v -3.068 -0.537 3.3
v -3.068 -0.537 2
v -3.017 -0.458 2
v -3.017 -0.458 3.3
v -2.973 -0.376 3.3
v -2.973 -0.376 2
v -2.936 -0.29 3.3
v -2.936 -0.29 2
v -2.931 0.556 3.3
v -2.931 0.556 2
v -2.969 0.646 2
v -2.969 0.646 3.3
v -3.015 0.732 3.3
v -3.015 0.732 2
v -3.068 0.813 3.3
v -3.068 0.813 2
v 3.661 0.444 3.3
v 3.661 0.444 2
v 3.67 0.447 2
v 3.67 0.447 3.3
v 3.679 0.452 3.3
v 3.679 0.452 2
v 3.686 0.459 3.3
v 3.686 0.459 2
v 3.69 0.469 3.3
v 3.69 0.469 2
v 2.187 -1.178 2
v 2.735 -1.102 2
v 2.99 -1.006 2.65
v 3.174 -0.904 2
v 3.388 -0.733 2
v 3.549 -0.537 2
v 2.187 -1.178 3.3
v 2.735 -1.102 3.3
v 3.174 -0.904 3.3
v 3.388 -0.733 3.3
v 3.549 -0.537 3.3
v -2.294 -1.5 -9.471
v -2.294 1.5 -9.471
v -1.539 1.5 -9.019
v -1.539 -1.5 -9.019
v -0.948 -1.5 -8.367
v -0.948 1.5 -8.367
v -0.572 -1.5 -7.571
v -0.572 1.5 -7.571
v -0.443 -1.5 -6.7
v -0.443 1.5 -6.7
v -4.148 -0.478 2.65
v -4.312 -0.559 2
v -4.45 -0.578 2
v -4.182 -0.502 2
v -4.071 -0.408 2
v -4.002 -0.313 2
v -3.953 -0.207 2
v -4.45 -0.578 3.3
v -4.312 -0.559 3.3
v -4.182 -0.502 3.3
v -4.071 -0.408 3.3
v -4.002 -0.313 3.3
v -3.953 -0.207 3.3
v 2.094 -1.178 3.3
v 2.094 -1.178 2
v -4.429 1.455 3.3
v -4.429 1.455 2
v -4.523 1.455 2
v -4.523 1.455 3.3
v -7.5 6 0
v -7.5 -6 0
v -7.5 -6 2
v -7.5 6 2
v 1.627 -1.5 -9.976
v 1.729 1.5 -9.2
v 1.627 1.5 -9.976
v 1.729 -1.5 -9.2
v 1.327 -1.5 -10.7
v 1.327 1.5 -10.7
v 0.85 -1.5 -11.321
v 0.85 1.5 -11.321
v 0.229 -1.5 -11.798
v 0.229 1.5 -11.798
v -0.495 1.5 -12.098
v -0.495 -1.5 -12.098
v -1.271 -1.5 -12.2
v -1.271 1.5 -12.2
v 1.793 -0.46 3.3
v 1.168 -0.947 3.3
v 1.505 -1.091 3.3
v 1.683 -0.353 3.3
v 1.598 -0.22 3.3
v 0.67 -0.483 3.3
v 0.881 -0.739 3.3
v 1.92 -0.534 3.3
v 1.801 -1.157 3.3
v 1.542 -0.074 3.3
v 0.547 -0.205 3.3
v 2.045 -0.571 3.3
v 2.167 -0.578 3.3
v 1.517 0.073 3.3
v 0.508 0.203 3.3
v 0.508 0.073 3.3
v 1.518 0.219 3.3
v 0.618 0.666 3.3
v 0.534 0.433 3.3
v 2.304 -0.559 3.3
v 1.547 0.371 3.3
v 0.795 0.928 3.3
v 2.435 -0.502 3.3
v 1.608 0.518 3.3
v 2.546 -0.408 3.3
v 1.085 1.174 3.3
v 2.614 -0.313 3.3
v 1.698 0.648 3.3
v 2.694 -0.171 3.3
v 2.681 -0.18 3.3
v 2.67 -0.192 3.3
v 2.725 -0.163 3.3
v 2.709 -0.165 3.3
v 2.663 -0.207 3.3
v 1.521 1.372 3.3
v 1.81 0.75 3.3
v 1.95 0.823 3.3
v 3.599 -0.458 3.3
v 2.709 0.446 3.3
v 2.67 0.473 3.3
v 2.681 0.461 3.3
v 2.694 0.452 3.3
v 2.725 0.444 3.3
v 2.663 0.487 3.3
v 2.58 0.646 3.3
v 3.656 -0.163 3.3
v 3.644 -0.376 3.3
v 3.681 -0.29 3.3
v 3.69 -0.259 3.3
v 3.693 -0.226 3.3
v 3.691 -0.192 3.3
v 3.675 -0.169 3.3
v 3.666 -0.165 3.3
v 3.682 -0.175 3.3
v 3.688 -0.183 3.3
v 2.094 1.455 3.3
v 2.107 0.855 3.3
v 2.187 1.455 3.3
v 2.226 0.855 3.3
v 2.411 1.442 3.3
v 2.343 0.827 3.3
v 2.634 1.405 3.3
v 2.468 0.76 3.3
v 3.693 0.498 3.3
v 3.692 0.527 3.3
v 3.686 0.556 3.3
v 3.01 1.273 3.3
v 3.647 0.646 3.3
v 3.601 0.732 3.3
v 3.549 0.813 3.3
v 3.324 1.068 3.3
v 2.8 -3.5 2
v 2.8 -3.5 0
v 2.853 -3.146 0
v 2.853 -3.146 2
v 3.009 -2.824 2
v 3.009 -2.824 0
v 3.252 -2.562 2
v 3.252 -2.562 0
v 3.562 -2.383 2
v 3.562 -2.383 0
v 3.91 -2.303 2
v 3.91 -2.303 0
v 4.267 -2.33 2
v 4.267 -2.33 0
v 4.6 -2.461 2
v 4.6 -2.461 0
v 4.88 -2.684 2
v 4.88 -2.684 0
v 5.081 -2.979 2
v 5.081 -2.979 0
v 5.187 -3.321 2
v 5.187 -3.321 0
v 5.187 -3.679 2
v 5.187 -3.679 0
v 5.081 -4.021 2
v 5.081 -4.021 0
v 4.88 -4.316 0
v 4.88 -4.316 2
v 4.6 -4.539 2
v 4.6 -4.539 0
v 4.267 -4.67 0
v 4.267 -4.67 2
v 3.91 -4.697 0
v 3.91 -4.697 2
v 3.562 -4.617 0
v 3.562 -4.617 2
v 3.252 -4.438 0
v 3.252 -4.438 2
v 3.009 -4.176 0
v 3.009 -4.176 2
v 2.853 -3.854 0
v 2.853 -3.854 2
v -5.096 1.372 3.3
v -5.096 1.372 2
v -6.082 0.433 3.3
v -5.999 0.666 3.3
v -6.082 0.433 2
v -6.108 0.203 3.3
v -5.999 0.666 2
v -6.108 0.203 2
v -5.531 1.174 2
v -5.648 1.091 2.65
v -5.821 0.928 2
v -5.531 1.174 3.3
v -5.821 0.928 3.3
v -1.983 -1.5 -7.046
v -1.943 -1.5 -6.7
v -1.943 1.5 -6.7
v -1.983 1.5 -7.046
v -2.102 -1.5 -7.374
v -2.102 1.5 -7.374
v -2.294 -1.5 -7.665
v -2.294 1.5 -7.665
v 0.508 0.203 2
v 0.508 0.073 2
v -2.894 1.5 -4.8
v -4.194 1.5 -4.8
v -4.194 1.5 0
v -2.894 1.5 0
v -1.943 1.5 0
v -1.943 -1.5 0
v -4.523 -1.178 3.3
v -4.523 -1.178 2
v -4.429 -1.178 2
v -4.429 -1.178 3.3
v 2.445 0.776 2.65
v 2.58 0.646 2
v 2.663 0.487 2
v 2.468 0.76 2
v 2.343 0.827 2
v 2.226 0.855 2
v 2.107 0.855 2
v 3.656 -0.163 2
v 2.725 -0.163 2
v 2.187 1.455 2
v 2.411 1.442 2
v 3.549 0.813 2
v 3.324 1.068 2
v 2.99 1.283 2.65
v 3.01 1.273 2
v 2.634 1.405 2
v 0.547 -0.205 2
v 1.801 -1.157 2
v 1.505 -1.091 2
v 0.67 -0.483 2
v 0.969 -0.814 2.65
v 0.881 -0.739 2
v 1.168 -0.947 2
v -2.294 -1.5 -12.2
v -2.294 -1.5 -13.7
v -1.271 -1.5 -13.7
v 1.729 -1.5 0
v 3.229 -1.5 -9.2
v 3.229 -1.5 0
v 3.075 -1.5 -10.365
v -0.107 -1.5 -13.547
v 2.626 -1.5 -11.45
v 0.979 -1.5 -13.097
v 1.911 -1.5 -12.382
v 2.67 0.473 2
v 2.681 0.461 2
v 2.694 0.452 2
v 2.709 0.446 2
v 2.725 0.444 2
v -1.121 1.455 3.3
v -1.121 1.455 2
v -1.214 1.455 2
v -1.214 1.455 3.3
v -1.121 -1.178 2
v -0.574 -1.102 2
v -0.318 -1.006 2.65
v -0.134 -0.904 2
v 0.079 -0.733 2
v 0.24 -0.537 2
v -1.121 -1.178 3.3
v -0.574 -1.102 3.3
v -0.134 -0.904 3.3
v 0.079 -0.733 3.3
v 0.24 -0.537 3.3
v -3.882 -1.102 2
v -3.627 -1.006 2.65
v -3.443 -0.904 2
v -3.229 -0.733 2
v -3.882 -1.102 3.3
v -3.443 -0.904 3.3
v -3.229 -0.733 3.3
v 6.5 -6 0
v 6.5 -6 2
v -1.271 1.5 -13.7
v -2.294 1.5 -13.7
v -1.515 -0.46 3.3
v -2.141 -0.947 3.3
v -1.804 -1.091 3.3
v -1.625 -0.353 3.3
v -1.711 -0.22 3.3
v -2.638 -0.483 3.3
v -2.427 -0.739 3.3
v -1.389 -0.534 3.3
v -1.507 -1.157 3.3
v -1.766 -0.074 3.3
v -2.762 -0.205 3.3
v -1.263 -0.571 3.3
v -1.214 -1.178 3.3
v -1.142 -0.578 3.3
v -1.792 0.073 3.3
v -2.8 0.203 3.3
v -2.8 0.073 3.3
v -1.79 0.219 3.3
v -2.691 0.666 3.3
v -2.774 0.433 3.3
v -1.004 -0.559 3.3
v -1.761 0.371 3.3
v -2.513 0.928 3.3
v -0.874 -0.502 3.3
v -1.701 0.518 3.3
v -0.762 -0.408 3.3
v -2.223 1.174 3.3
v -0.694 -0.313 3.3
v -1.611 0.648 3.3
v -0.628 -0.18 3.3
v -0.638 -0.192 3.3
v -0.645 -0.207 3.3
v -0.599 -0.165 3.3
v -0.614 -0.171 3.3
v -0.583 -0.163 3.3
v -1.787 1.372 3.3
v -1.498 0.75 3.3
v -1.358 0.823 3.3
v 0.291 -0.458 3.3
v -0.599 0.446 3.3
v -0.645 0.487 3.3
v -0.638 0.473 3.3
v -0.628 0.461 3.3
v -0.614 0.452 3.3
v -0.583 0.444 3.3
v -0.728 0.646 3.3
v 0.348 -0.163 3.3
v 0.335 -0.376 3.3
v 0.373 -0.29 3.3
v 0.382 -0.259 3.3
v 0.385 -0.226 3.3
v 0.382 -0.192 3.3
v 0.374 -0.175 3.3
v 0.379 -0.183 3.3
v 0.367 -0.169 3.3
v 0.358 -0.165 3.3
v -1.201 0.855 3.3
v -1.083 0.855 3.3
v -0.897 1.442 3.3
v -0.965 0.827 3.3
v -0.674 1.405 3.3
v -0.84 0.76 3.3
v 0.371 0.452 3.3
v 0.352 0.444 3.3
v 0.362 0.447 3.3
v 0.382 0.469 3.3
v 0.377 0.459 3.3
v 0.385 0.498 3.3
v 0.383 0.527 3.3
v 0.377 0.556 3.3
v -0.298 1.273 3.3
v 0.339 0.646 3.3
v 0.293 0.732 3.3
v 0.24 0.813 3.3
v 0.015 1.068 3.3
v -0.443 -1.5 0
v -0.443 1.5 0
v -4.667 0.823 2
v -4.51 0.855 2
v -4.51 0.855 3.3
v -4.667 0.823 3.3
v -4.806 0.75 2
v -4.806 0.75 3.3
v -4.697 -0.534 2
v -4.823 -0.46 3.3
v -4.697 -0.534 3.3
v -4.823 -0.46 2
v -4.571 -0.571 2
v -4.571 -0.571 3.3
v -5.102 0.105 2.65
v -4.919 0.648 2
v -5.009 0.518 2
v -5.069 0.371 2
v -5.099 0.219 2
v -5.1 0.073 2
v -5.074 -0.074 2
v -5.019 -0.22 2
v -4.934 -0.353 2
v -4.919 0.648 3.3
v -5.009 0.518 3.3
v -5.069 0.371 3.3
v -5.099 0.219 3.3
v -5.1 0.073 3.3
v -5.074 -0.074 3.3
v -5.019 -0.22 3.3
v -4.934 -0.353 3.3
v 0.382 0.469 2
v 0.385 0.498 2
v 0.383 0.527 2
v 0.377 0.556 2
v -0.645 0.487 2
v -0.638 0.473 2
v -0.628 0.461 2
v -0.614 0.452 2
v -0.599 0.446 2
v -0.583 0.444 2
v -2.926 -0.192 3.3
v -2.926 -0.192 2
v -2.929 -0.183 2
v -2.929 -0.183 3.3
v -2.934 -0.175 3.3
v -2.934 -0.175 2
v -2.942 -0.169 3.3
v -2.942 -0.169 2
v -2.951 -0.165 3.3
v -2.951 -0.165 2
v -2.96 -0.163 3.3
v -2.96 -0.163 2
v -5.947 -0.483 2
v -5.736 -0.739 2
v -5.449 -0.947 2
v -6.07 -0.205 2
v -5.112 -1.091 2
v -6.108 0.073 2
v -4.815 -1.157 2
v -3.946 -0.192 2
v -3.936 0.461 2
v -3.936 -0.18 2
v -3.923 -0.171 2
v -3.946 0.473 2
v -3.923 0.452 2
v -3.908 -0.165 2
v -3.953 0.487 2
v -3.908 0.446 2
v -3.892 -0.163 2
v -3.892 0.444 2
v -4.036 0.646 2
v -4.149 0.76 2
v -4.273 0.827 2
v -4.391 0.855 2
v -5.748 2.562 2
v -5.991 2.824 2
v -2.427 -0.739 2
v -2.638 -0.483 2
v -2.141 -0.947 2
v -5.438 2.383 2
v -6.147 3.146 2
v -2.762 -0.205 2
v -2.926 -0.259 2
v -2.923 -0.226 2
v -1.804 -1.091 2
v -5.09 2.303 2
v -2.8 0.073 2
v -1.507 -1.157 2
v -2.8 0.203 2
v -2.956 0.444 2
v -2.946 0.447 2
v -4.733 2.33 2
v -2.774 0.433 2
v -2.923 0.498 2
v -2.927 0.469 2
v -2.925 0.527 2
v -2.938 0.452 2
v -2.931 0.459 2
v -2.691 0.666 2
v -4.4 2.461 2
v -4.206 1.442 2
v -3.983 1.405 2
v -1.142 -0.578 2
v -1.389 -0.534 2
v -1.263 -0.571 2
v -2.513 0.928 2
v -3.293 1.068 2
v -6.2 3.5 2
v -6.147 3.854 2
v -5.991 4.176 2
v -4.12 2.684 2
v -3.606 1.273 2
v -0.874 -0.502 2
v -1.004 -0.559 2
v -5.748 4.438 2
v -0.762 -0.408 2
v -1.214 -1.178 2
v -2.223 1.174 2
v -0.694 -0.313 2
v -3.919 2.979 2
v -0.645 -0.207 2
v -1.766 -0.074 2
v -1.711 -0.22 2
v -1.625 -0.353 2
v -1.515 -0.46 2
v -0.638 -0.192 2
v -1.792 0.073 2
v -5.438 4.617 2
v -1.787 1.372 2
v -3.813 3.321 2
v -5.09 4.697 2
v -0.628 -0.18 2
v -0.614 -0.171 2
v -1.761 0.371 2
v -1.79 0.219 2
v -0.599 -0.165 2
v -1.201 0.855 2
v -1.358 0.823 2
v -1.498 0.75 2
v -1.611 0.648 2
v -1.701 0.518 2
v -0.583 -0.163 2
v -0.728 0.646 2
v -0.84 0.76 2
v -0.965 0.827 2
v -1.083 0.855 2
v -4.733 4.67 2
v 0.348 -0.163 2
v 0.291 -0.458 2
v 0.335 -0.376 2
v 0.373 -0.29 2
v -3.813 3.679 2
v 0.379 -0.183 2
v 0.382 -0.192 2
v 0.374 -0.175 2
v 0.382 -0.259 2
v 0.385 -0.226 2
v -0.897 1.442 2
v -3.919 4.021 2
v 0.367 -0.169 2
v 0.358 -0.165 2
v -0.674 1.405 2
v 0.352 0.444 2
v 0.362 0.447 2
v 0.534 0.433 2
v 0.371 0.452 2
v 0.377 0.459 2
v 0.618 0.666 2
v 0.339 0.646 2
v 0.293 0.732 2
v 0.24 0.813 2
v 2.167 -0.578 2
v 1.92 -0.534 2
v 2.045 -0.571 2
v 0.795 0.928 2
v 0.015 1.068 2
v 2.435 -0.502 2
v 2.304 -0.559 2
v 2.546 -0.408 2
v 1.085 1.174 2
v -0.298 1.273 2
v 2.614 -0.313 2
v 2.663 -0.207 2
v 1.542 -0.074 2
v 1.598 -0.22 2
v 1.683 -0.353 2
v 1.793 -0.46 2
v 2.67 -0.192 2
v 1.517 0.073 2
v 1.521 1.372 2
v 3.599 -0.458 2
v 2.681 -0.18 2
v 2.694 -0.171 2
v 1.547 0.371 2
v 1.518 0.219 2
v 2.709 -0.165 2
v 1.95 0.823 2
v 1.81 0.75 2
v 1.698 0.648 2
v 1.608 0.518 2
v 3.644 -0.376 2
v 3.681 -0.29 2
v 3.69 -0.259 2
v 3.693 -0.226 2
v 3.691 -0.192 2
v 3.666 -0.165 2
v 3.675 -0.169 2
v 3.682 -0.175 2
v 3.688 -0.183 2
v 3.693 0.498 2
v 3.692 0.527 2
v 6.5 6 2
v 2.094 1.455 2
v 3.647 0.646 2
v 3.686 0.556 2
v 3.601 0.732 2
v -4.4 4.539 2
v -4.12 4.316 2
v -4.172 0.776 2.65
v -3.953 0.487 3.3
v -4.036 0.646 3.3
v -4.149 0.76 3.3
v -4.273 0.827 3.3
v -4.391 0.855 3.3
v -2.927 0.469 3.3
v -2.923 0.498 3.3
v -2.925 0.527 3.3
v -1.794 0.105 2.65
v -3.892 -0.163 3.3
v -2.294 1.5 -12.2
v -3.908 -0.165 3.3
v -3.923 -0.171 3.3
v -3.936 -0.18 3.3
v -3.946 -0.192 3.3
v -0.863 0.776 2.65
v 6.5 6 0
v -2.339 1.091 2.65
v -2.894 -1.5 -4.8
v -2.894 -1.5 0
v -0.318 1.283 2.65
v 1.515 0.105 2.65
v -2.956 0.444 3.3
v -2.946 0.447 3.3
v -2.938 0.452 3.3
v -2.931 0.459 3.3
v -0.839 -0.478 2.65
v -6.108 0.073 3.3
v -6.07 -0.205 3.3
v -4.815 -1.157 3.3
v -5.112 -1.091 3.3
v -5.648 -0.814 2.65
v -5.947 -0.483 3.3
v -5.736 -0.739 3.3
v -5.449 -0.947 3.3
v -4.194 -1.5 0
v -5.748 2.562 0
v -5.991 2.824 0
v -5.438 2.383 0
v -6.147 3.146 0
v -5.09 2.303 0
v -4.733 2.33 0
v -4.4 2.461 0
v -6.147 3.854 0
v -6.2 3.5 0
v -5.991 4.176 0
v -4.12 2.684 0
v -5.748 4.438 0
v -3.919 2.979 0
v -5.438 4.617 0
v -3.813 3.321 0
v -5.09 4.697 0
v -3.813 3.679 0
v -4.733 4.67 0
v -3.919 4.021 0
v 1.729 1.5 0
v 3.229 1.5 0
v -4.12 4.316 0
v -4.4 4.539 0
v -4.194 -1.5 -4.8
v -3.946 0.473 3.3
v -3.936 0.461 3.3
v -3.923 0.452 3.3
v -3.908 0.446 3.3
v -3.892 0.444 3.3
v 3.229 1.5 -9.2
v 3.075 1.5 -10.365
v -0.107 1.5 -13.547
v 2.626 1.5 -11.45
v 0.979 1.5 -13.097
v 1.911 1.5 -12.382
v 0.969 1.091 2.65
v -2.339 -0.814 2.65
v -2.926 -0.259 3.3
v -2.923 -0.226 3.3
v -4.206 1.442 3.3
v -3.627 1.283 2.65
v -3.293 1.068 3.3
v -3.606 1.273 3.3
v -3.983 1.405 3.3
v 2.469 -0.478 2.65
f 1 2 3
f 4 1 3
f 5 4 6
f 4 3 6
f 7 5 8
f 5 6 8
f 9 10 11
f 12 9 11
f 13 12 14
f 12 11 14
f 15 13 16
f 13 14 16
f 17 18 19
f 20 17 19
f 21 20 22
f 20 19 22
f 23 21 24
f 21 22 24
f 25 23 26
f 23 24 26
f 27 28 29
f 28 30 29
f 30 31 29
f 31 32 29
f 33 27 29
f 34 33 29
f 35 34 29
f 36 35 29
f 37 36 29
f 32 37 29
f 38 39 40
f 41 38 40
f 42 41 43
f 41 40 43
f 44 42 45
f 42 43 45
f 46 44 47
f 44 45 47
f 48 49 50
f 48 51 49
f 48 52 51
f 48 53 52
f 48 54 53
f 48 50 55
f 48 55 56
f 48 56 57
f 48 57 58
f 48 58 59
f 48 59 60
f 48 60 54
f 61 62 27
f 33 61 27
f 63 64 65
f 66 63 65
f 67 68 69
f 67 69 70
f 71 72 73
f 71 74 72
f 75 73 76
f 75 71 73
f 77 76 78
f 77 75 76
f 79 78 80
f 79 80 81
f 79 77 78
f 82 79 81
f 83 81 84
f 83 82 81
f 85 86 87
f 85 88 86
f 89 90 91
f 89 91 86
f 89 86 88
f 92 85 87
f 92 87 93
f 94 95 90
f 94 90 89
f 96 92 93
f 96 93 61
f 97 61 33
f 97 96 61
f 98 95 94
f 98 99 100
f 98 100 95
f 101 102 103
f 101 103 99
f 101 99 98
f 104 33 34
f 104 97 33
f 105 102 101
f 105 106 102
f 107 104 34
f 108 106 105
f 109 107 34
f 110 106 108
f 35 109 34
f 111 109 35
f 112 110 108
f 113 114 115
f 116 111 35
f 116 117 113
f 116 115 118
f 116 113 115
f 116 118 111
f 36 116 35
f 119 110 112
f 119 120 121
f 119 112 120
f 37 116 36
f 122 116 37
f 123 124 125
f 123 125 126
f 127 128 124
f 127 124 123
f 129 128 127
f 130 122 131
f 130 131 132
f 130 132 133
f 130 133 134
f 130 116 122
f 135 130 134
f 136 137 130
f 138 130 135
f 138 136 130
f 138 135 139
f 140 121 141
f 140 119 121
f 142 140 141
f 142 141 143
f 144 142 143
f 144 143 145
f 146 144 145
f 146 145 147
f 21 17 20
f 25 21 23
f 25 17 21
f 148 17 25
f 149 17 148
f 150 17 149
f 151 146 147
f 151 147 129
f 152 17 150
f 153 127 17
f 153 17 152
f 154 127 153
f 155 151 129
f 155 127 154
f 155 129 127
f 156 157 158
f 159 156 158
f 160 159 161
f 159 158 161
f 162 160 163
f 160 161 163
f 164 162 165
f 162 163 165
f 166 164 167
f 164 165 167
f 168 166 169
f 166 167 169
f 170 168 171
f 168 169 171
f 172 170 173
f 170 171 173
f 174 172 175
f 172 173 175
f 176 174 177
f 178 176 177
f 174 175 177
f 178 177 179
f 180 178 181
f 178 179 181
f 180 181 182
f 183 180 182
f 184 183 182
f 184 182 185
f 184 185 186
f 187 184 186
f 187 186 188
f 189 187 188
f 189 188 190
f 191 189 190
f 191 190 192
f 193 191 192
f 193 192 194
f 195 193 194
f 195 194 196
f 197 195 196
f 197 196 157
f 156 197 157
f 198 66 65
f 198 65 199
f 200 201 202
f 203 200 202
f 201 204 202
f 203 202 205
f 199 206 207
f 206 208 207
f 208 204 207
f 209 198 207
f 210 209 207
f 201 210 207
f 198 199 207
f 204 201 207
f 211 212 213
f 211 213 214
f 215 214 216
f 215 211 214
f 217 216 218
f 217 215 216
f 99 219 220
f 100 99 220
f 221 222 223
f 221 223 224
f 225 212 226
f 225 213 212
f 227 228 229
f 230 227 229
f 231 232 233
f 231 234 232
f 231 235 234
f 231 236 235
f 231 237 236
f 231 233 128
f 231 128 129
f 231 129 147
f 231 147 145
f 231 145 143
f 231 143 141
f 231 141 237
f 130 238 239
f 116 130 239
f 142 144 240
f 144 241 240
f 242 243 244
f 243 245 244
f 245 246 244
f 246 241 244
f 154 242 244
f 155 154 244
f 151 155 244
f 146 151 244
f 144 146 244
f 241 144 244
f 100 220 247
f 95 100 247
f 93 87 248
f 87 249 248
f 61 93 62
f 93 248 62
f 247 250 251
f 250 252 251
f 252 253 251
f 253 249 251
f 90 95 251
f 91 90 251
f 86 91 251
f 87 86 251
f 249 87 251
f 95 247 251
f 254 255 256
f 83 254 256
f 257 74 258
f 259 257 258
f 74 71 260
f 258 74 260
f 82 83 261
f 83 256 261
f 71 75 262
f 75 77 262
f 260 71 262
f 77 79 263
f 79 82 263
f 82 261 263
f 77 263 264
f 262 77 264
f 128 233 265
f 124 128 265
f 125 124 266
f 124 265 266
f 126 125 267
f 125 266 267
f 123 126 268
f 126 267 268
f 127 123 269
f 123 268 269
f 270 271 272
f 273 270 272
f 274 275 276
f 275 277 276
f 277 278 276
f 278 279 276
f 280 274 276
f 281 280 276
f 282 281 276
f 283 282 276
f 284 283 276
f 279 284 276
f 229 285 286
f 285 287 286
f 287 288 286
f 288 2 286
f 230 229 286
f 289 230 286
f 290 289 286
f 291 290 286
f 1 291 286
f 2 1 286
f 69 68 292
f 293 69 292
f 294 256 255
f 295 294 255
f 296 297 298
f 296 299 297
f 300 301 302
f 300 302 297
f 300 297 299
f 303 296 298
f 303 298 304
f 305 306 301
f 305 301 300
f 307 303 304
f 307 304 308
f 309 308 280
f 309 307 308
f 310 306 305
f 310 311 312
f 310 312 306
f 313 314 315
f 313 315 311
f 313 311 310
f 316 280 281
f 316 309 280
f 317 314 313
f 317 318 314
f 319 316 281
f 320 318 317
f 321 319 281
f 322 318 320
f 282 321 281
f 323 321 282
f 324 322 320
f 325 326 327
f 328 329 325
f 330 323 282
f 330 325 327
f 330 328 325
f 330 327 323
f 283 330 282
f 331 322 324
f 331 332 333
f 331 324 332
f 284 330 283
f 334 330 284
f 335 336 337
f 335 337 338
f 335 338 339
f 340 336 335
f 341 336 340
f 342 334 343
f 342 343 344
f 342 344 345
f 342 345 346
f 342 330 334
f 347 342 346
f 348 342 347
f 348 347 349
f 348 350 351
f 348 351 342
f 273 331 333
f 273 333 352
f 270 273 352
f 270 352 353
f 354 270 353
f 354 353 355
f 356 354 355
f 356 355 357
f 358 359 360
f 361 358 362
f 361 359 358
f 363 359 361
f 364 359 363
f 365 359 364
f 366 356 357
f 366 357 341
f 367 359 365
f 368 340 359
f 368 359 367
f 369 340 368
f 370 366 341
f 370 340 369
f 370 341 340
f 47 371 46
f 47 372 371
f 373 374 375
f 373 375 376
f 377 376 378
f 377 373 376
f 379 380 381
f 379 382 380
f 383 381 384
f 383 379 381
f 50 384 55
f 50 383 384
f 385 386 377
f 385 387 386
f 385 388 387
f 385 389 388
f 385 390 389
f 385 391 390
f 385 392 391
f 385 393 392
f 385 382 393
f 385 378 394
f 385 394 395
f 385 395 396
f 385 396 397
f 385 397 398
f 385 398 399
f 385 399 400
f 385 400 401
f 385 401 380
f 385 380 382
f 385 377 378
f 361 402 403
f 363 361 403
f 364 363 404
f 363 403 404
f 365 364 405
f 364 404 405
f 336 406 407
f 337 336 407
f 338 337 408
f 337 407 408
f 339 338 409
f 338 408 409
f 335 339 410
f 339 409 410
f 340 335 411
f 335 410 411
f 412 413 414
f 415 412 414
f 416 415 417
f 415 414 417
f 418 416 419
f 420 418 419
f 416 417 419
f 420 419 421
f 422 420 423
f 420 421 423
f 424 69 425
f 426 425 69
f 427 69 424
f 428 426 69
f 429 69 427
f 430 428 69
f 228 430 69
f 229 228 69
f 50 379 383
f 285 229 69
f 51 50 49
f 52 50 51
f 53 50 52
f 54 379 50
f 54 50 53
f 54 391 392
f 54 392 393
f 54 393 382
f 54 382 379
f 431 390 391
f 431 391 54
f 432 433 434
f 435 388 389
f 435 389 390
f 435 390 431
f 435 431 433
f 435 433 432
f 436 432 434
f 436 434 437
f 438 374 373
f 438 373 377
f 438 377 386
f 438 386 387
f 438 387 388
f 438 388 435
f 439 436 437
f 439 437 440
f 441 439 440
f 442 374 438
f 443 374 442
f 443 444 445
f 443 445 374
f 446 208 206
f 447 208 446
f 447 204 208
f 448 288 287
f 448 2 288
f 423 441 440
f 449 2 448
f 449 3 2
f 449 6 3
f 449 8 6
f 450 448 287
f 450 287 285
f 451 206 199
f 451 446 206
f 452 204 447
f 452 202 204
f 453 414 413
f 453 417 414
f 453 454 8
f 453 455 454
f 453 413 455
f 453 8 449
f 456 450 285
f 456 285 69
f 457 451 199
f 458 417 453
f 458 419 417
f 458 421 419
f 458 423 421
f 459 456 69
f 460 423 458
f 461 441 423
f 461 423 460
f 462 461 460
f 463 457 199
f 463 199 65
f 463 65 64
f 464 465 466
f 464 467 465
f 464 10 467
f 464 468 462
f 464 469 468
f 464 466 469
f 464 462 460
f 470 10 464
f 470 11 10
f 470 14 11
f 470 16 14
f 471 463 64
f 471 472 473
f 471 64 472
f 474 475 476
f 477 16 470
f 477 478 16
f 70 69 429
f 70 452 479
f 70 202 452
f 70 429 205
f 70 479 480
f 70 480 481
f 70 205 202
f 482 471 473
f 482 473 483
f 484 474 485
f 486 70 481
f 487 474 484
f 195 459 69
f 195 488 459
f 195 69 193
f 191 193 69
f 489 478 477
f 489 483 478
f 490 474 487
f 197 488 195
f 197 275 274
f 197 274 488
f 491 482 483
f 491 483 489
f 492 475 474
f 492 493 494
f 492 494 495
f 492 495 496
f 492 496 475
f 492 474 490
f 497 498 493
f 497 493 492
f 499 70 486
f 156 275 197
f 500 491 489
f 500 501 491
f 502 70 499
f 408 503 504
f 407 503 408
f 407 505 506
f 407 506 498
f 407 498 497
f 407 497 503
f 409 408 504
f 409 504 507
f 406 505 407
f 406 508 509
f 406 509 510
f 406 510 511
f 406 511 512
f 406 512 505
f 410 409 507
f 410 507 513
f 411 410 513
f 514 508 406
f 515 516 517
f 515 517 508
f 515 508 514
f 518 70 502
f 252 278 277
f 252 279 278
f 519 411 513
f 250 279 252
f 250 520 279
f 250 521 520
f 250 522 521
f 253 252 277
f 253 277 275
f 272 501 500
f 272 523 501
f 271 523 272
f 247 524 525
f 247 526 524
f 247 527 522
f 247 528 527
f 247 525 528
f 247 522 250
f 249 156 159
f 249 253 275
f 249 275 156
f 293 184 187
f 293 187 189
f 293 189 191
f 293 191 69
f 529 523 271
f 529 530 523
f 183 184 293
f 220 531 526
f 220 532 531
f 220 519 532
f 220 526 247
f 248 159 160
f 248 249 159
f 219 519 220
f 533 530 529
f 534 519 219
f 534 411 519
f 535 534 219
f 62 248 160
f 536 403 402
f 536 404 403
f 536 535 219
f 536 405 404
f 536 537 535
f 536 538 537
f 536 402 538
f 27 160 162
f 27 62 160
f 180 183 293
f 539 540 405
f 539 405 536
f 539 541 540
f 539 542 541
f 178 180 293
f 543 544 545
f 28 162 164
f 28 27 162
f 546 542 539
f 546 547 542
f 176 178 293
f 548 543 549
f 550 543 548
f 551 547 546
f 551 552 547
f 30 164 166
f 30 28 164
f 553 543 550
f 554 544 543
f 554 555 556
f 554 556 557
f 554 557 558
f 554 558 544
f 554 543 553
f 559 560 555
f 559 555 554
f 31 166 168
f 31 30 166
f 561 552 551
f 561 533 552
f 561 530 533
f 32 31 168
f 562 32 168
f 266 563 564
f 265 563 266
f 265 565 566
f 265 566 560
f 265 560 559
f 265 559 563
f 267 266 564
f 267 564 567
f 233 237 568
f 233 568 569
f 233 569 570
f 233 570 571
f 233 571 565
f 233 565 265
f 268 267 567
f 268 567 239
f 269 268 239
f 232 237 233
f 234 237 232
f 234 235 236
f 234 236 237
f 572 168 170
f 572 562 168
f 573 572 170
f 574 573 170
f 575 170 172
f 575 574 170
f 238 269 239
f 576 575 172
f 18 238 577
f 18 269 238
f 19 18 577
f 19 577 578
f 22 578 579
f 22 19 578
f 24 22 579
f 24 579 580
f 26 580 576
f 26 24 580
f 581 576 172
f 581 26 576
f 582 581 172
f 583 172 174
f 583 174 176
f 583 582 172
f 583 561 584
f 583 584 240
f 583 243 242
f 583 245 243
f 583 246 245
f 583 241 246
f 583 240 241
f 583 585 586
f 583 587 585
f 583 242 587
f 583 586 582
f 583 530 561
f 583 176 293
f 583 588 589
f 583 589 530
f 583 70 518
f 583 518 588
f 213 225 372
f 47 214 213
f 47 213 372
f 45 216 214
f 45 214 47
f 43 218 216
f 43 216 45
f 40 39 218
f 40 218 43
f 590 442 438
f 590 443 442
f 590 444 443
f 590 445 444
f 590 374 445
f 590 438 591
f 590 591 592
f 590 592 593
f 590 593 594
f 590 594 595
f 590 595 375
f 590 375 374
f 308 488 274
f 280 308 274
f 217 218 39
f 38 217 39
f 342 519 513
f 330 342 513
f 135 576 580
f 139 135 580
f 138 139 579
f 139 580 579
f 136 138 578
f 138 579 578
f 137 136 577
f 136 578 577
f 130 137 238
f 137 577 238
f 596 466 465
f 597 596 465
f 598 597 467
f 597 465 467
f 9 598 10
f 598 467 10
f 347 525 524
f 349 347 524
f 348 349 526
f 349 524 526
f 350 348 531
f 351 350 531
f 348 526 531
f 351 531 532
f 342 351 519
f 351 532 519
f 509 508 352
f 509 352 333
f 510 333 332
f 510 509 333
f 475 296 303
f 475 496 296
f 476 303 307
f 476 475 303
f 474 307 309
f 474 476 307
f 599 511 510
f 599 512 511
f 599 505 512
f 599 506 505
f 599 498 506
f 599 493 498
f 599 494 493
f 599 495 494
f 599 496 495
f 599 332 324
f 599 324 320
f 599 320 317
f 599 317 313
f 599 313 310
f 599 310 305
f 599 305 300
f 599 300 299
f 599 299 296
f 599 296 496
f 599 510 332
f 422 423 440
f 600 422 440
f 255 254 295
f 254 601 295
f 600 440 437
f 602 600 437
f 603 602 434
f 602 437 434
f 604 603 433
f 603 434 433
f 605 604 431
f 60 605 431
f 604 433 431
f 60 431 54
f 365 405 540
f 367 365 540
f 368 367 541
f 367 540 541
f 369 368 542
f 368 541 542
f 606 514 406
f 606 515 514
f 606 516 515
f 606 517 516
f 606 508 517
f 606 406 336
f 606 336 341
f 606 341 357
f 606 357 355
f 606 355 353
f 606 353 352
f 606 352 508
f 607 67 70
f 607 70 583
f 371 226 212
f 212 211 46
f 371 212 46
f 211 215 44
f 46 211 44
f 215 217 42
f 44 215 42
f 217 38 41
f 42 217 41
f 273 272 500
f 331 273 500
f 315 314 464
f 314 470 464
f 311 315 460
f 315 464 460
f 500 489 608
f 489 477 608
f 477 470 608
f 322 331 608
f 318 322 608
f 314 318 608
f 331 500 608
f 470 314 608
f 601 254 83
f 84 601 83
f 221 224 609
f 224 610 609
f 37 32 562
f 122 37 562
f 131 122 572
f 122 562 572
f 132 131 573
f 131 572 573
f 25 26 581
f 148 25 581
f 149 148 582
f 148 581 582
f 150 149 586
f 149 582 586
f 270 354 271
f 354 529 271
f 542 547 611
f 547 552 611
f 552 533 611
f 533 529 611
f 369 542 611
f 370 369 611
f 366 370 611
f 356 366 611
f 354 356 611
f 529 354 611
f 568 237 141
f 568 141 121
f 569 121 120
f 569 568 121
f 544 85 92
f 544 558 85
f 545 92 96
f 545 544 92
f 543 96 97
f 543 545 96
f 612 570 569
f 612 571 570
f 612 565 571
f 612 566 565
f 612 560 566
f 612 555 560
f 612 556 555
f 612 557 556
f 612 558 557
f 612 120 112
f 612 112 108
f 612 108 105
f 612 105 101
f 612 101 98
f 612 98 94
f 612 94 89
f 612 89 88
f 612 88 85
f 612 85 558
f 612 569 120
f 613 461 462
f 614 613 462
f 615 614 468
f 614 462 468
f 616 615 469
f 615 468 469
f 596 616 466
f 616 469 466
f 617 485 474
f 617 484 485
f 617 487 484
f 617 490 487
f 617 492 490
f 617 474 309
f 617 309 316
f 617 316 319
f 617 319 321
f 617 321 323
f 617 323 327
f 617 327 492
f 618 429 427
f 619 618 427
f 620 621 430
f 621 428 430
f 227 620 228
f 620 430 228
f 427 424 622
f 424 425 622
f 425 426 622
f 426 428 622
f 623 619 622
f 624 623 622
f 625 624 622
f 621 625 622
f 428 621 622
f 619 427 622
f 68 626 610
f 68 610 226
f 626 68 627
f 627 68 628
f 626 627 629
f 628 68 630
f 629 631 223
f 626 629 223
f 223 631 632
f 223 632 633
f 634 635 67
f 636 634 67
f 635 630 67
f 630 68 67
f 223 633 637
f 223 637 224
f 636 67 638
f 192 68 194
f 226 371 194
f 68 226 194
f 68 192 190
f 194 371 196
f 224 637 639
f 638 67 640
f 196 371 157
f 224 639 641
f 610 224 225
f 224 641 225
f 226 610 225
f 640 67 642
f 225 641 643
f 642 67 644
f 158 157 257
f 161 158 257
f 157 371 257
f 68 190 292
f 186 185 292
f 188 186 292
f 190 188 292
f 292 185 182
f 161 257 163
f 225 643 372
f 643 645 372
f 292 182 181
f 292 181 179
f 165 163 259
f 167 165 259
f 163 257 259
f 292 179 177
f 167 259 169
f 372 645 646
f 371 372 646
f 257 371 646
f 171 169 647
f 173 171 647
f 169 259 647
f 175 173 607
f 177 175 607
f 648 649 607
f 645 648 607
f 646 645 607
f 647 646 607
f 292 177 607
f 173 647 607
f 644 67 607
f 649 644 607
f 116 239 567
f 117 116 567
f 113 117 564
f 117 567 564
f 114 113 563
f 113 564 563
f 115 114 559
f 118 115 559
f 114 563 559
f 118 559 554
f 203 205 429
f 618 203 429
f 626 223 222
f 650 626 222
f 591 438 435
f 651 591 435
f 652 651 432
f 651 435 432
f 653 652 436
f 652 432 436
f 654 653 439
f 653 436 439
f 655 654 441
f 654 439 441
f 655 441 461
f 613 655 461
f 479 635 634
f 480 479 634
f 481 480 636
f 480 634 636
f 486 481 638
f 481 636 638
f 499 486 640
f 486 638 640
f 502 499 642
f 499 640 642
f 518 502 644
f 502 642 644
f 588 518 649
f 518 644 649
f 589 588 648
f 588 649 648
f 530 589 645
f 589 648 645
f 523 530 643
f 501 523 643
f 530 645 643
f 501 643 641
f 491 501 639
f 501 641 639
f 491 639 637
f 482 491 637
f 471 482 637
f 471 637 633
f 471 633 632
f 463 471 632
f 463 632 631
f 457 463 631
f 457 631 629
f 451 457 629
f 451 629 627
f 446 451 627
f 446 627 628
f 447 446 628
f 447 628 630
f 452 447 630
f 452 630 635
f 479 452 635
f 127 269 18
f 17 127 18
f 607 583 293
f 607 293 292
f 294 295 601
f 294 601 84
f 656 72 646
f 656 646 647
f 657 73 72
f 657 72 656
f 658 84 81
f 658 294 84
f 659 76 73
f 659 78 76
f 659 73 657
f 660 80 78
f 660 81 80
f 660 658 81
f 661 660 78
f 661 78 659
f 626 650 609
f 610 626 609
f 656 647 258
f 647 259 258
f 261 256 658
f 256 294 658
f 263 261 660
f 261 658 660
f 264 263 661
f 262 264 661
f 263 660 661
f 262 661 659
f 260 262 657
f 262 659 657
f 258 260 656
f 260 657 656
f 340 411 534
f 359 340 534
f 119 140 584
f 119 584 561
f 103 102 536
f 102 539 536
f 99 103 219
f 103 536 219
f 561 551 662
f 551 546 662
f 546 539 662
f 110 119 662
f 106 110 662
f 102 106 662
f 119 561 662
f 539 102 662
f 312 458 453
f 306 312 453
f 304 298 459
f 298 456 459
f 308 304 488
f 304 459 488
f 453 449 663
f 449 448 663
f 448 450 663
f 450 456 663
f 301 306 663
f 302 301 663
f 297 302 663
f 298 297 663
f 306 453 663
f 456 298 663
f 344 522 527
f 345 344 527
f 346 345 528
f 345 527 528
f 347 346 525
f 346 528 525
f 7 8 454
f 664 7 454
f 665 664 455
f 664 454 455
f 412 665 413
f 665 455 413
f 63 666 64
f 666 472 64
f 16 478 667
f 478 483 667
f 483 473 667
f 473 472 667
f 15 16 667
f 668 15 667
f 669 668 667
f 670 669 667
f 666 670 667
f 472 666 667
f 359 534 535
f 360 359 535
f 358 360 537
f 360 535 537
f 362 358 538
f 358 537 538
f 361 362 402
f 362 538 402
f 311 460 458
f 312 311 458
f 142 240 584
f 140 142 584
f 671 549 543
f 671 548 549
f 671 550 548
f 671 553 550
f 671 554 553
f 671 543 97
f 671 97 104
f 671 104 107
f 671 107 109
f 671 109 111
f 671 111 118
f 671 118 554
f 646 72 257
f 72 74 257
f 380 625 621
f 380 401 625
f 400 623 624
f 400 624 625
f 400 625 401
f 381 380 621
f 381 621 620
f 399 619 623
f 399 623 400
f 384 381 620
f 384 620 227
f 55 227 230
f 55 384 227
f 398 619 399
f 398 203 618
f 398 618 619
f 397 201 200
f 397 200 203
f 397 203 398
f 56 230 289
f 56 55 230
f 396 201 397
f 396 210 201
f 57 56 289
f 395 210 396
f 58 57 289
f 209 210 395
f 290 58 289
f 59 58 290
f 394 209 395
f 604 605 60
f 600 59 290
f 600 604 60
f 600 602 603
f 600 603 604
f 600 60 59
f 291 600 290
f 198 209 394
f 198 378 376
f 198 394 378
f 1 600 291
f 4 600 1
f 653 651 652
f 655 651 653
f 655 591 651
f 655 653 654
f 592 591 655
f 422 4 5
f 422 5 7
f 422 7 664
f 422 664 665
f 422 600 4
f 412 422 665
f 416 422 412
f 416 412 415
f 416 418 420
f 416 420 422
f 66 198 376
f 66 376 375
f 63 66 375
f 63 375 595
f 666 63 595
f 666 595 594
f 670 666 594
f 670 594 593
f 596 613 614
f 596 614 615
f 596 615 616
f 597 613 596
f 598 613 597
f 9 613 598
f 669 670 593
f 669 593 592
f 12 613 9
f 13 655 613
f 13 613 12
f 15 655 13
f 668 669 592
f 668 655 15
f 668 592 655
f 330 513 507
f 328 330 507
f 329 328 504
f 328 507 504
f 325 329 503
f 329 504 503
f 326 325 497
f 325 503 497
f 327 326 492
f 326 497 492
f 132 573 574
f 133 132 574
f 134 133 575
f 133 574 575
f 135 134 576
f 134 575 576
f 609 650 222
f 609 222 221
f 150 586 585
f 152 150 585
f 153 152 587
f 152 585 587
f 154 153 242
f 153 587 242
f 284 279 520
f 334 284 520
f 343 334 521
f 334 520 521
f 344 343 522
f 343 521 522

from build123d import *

# Parameters (mm, degrees)
SKETCH1_W           = 15
SKETCH1_H           = 12
BOSS_EXTRUDE1_DEPTH = 2
BOSS_EXTRUDE2_DEPTH = 2
SKETCH3_W           = 1.5
SKETCH3_H           = 4.8
BOSS_EXTRUDE3_DEPTH = 1.5
FILLET3_R           = 1.5
FILLET4_R           = 3
FILLET5_R           = 3
FILLET6_R           = 4.5
SKETCH4_W           = 2
SKETCH4_H           = 12
CUT_EXTRUDE1_DEPTH  = 1
SKETCH5_R           = 1.2
CUT_EXTRUDE2_DEPTH  = 17.731407672
CUT_EXTRUDE3_START  = -0.7
CUT_EXTRUDE3_DEPTH  = 0.7
SKETCH7_W           = 1.148621372
SKETCH7_H           = 6.2
CUT_EXTRUDE4_DEPTH  = 18.325992122
SKETCH8_W           = 0.2
SKETCH8_H           = 4.8
CUT_EXTRUDE5_DEPTH  = 18.325992122


with BuildPart() as part:
    # Sketch1 → Boss-Extrude1 (new body)
    with BuildSketch(Plane.XY):
        Rectangle(SKETCH1_W, SKETCH1_H)
    extrude(amount=BOSS_EXTRUDE1_DEPTH)

    # Sketch2 → Boss-Extrude2 (add)
    with BuildSketch(Plane.XY.offset(2)):
        with BuildLine():
            Line((-0.583484164, 0.443787032), (0.352350759, 0.443787032))
            ThreePointArc((0.352350759, 0.443787032), (0.370660979, 0.451874829), (0.381594807, 0.468641703))
            ThreePointArc((0.381594807, 0.468641703), (0.38478126, 0.512633483), (0.377406248, 0.556119567))
            ThreePointArc((0.377406248, 0.556119567), (0.316958398, 0.689104808), (0.240244136, 0.81341868))
            add(Edge.make_bspline(
                [(0.240244136, 0.81341868), (-0.178053426, 1.454553053), (-1.120854898, 1.454553053)],
                knots=[3.484341046, 3.484341046, 3.484341046, 4.522924348, 4.522924348, 4.522924348], degree=2, weights=[1, 0.868170926, 1]))
            Line((-1.120854898, 1.454553053), (-1.214475951, 1.454553068))
            add(Edge.make_bspline(
                [(-1.214475951, 1.454553068), (-2.800132813, 1.454553068), (-2.800132813, 0.203397992)],
                knots=[1.670440536, 1.670440536, 1.670440536, 3.203377674, 3.203377674, 3.203377674], degree=2, weights=[1, 0.720364542, 1]))
            Line((-2.800132813, 0.203397992), (-2.800132806, 0.073267738))
            add(Edge.make_bspline(
                [(-2.800132806, 0.073267738), (-2.800132806, -1.177887338), (-1.214475944, -1.177887338)],
                knots=[3.079807634, 3.079807634, 3.079807634, 4.612744771, 4.612744771, 4.612744771], degree=2, weights=[1, 0.720364542, 1]))
            Line((-1.214475944, -1.177887338), (-1.120854891, -1.177887375))
            add(Edge.make_bspline(
                [(-1.120854891, -1.177887375), (-0.178053419, -1.177887375), (0.240244143, -0.536753002)],
                knots=[1.760260959, 1.760260959, 1.760260959, 2.798844261, 2.798844261, 2.798844261], degree=2, weights=[1, 0.868170926, 1]))
            ThreePointArc((0.240244143, -0.536753002), (0.313994237, -0.417650167), (0.372658208, -0.290437354))
            ThreePointArc((0.372658208, -0.290437354), (0.384251196, -0.24211404), (0.382489087, -0.192450825))
            ThreePointArc((0.382489087, -0.192450825), (0.370484527, -0.171527836), (0.347824512, -0.163257123))
            Line((0.347824512, -0.163257123), (-0.58348421, -0.163257123))
            ThreePointArc((-0.58348421, -0.163257123), (-0.62125204, -0.175257922), (-0.645165579, -0.206858093))
            add(Edge.make_bspline(
                [(-1.141657158, -0.577741646), (-0.776549247, -0.578100851), (-0.645165579, -0.206858093)],
                knots=[5.955155363, 5.955155363, 5.955155363, 7.020735545, 7.020735545, 7.020735545], degree=2, weights=[1, 0.86139323, 1]))
            add(Edge.make_bspline(
                [(-1.201450314, 0.854894524), (-1.823540048, 0.823436889), (-1.793554178, 0.104979402), (-1.763568309, -0.613478086), (-1.141657158, -0.577741646)],
                knots=[0.039432941, 0.039432941, 0.039432941, 1.613207044, 1.613207044, 3.186981147, 3.186981147, 3.186981147], degree=2, weights=[1, 0.706053195, 1, 0.706053195, 1]))
            add(Edge.make_bspline(
                [(-0.645165584, 0.487388037), (-0.79140441, 0.900606071), (-1.201450314, 0.854894524)],
                knots=[2.404042441, 2.404042441, 2.404042441, 3.565685694, 3.565685694, 3.565685694], degree=2, weights=[1, 0.836012096, 1]))
            ThreePointArc((-0.645165584, 0.487388037), (-0.621252025, 0.455787841), (-0.583484164, 0.443787032))
        make_face()
        with BuildLine():
            Line((-3.89178871, 0.443787032), (-2.955953786, 0.443787032))
            ThreePointArc((-2.955953786, 0.443787032), (-2.937643536, 0.451874816), (-2.926709688, 0.468641703))
            ThreePointArc((-2.926709688, 0.468641703), (-2.923523234, 0.512633483), (-2.930898247, 0.556119567))
            ThreePointArc((-2.930898247, 0.556119567), (-2.991346096, 0.689104808), (-3.068060358, 0.81341868))
            add(Edge.make_bspline(
                [(-3.068060358, 0.81341868), (-3.48635792, 1.454553053), (-4.429159392, 1.454553053)],
                knots=[3.484341046, 3.484341046, 3.484341046, 4.522924348, 4.522924348, 4.522924348], degree=2, weights=[1, 0.868170926, 1]))
            Line((-4.429159392, 1.454553053), (-4.522780446, 1.454553068))
            add(Edge.make_bspline(
                [(-4.522780446, 1.454553068), (-6.108437307, 1.454553068), (-6.108437307, 0.203397992)],
                knots=[4.81203319, 4.81203319, 4.81203319, 6.344970327, 6.344970327, 6.344970327], degree=2, weights=[1, 0.720364542, 1]))
            Line((-6.108437307, 0.203397992), (-6.108437352, 0.073267738))
            add(Edge.make_bspline(
                [(-6.108437352, 0.073267738), (-6.108437352, -1.177887338), (-4.52278049, -1.177887338)],
                knots=[6.221400287, 6.221400287, 6.221400287, 7.754337425, 7.754337425, 7.754337425], degree=2, weights=[1, 0.720364542, 1]))
            Line((-4.52278049, -1.177887338), (-4.429159437, -1.177887375))
            add(Edge.make_bspline(
                [(-4.429159437, -1.177887375), (-3.486357965, -1.177887375), (-3.068060402, -0.536753002)],
                knots=[1.760260959, 1.760260959, 1.760260959, 2.798844261, 2.798844261, 2.798844261], degree=2, weights=[1, 0.868170926, 1]))
            ThreePointArc((-3.068060402, -0.536753002), (-2.994310308, -0.417650167), (-2.935646337, -0.290437354))
            ThreePointArc((-2.935646337, -0.290437354), (-2.92405335, -0.24211404), (-2.925815458, -0.192450825))
            ThreePointArc((-2.925815458, -0.192450825), (-2.937820019, -0.171527836), (-2.960480033, -0.163257123))
            Line((-2.960480033, -0.163257123), (-3.891788755, -0.163257123))
            ThreePointArc((-3.891788755, -0.163257123), (-3.929556585, -0.175257922), (-3.953470124, -0.206858093))
            add(Edge.make_bspline(
                [(-4.449961703, -0.577741646), (-4.084853792, -0.578100851), (-3.953470124, -0.206858093)],
                knots=[5.955155363, 5.955155363, 5.955155363, 7.020735545, 7.020735545, 7.020735545], degree=2, weights=[1, 0.86139323, 1]))
            add(Edge.make_bspline(
                [(-4.509754859, 0.854894524), (-5.131844593, 0.82343689), (-5.101858724, 0.104979402), (-5.071872854, -0.613478086), (-4.449961703, -0.577741646)],
                knots=[0.039432941, 0.039432941, 0.039432941, 1.613207044, 1.613207044, 3.186981147, 3.186981147, 3.186981147], degree=2, weights=[1, 0.706053195, 1, 0.706053195, 1]))
            add(Edge.make_bspline(
                [(-3.95347013, 0.487388037), (-4.099708956, 0.900606071), (-4.509754859, 0.854894524)],
                knots=[2.40404244, 2.40404244, 2.40404244, 3.565685694, 3.565685694, 3.565685694], degree=2, weights=[1, 0.836012096, 1]))
            ThreePointArc((-3.95347013, 0.487388037), (-3.92955657, 0.455787841), (-3.89178871, 0.443787032))
        make_face()
        with BuildLine():
            Line((2.724820382, 0.443787032), (3.660655305, 0.443787032))
            ThreePointArc((3.660655305, 0.443787032), (3.678965525, 0.451874829), (3.689899353, 0.468641703))
            ThreePointArc((3.689899353, 0.468641703), (3.693085806, 0.512633483), (3.685710794, 0.556119567))
            ThreePointArc((3.685710794, 0.556119567), (3.625262944, 0.689104808), (3.548548682, 0.81341868))
            add(Edge.make_bspline(
                [(3.548548682, 0.81341868), (3.13025112, 1.454553053), (2.187449648, 1.454553053)],
                knots=[0.342748392, 0.342748392, 0.342748392, 1.381331695, 1.381331695, 1.381331695], degree=2, weights=[1, 0.868170926, 1]))
            Line((2.187449648, 1.454553053), (2.093828595, 1.454553068))
            add(Edge.make_bspline(
                [(2.093828595, 1.454553068), (0.508171733, 1.454553068), (0.508171733, 0.203397992)],
                knots=[4.81203319, 4.81203319, 4.81203319, 6.344970327, 6.344970327, 6.344970327], degree=2, weights=[1, 0.720364542, 1]))
            Line((0.508171733, 0.203397992), (0.50817174, 0.073267738))
            add(Edge.make_bspline(
                [(0.50817174, 0.073267738), (0.50817174, -1.177887338), (2.093828602, -1.177887338)],
                knots=[3.079807634, 3.079807634, 3.079807634, 4.612744771, 4.612744771, 4.612744771], degree=2, weights=[1, 0.720364542, 1]))
            Line((2.093828602, -1.177887338), (2.187449655, -1.177887375))
            add(Edge.make_bspline(
                [(2.187449655, -1.177887375), (3.130251127, -1.177887375), (3.548548689, -0.536753002)],
                knots=[1.760260959, 1.760260959, 1.760260959, 2.798844261, 2.798844261, 2.798844261], degree=2, weights=[1, 0.868170926, 1]))
            ThreePointArc((3.548548689, -0.536753002), (3.622298783, -0.417650167), (3.680962754, -0.290437354))
            ThreePointArc((3.680962754, -0.290437354), (3.692555742, -0.24211404), (3.690793633, -0.192450825))
            ThreePointArc((3.690793633, -0.192450825), (3.678789073, -0.171527836), (3.656129058, -0.163257123))
            Line((3.656129058, -0.163257123), (2.724820336, -0.163257123))
            ThreePointArc((2.724820336, -0.163257123), (2.687052506, -0.175257922), (2.663138967, -0.206858093))
            add(Edge.make_bspline(
                [(2.166647388, -0.577741646), (2.531755299, -0.578100851), (2.663138967, -0.206858093)],
                knots=[5.955155363, 5.955155363, 5.955155363, 7.020735545, 7.020735545, 7.020735545], degree=2, weights=[1, 0.86139323, 1]))
            add(Edge.make_bspline(
                [(2.106854232, 0.854894524), (1.484764498, 0.823436889), (1.514750368, 0.104979402), (1.544736237, -0.613478086), (2.166647388, -0.577741646)],
                knots=[3.181025595, 3.181025595, 3.181025595, 4.754799698, 4.754799698, 6.328573801, 6.328573801, 6.328573801], degree=2, weights=[1, 0.706053195, 1, 0.706053195, 1]))
            add(Edge.make_bspline(
                [(2.663138962, 0.487388037), (2.516900136, 0.900606071), (2.106854232, 0.854894524)],
                knots=[5.545635094, 5.545635094, 5.545635094, 6.707278348, 6.707278348, 6.707278348], degree=2, weights=[1, 0.836012096, 1]))
            ThreePointArc((2.663138962, 0.487388037), (2.687052521, 0.455787841), (2.724820382, 0.443787032))
        make_face()
    extrude(amount=BOSS_EXTRUDE2_DEPTH)

    # Sketch3 → Boss-Extrude3 (add, symmetric)
    with BuildSketch(Plane(origin=(0, 0, 0), x_dir=(1, 0, 0), z_dir=(0, 1, 0))):
        Polygon((1.72873188, 0), (3.22873188, 0), (3.22873188, 13.7), (-3.442646753, 13.7), (-3.442646753, 12.2), (1.72873188, 12.2), align=None)
        with Locations((-3.644025381, 2.4)):
            Rectangle(SKETCH3_W, SKETCH3_H)
        Polygon((-1.942646753, 0), (-0.442646753, 0), (-0.442646753, 9.7), (-3.442646753, 9.7), (-3.442646753, 8.2), (-1.942646753, 8.2), align=None)
    extrude(amount=BOSS_EXTRUDE3_DEPTH, both=True)

    # Fillet3
    fillet3_edges = [part.edges().sort_by_distance(p)[0] for p in [
        (-1.942646753, 0, -8.2),
    ]]
    fillet(fillet3_edges, radius=FILLET3_R - 0.0001)  # a hair under: the kernel refuses the full size

    # Fillet4
    fillet4_edges = [part.edges().sort_by_distance(p)[0] for p in [
        (-0.442646753, 0, -9.7),
    ]]
    fillet(fillet4_edges, radius=FILLET4_R - 0.0001)  # a hair under: the kernel refuses the full size

    # Fillet5
    fillet5_edges = [part.edges().sort_by_distance(p)[0] for p in [
        (1.72873188, 0, -12.2),
    ]]
    fillet(fillet5_edges, radius=FILLET5_R)

    # Fillet6
    fillet6_edges = [part.edges().sort_by_distance(p)[0] for p in [
        (3.22873188, 0, -13.7),
    ]]
    fillet(fillet6_edges, radius=FILLET6_R)

    # Sketch4 → Cut-Extrude1 (cut)
    with BuildSketch(Plane(origin=(7.5, 0, 0), x_dir=(0, 0, -1), z_dir=(1, 0, 0))):
        with Locations((-1, 0)):
            Rectangle(SKETCH4_W, SKETCH4_H)
    extrude(amount=-CUT_EXTRUDE1_DEPTH, mode=Mode.SUBTRACT)

    # Sketch5 → Cut-Extrude2 (cut, through all)
    with BuildSketch(Plane(origin=(0, 0, 0), x_dir=(-1, 0, 0), z_dir=(0, 0, -1))):
        with Locations((-4, -3.5)):
            Circle(SKETCH5_R)
        with Locations((5, 3.5)):
            Circle(SKETCH5_R)
    extrude(amount=-CUT_EXTRUDE2_DEPTH, mode=Mode.SUBTRACT)

    # Sketch6 → Cut-Extrude3 (cut)
    with BuildSketch(Plane.XY.offset(4).offset(CUT_EXTRUDE3_START)):
        with BuildLine():
            Line((2.724820382, 0.443787032), (3.660655305, 0.443787032))
            ThreePointArc((3.660655305, 0.443787032), (3.678965525, 0.451874829), (3.689899353, 0.468641703))
            ThreePointArc((3.689899353, 0.468641703), (3.693085806, 0.512633483), (3.685710794, 0.556119567))
            ThreePointArc((3.685710794, 0.556119567), (3.625262944, 0.689104808), (3.548548682, 0.81341868))
            add(Edge.make_bspline(
                [(3.548548682, 0.81341868), (3.13025112, 1.454553053), (2.187449648, 1.454553053)],
                knots=[0.342748392, 0.342748392, 0.342748392, 1.381331695, 1.381331695, 1.381331695], degree=2, weights=[1, 0.868170926, 1]))
            Line((2.187449648, 1.454553053), (2.093828595, 1.454553068))
            add(Edge.make_bspline(
                [(2.093828595, 1.454553068), (0.508171733, 1.454553068), (0.508171733, 0.203397992)],
                knots=[4.81203319, 4.81203319, 4.81203319, 6.344970327, 6.344970327, 6.344970327], degree=2, weights=[1, 0.720364542, 1]))
            Line((0.508171733, 0.203397992), (0.50817174, 0.073267738))
            add(Edge.make_bspline(
                [(0.50817174, 0.073267738), (0.50817174, -1.177887338), (2.093828602, -1.177887338)],
                knots=[3.079807634, 3.079807634, 3.079807634, 4.612744771, 4.612744771, 4.612744771], degree=2, weights=[1, 0.720364542, 1]))
            Line((2.093828602, -1.177887338), (2.187449655, -1.177887375))
            add(Edge.make_bspline(
                [(2.187449655, -1.177887375), (3.130251127, -1.177887375), (3.548548689, -0.536753002)],
                knots=[1.760260959, 1.760260959, 1.760260959, 2.798844261, 2.798844261, 2.798844261], degree=2, weights=[1, 0.868170926, 1]))
            ThreePointArc((3.548548689, -0.536753002), (3.622298783, -0.417650167), (3.680962754, -0.290437354))
            ThreePointArc((3.680962754, -0.290437354), (3.692555742, -0.24211404), (3.690793633, -0.192450825))
            ThreePointArc((3.690793633, -0.192450825), (3.678789073, -0.171527836), (3.656129058, -0.163257123))
            Line((3.656129058, -0.163257123), (2.724820336, -0.163257123))
            ThreePointArc((2.724820336, -0.163257123), (2.687052506, -0.175257922), (2.663138967, -0.206858093))
            add(Edge.make_bspline(
                [(2.166647388, -0.577741646), (2.531755299, -0.578100851), (2.663138967, -0.206858093)],
                knots=[5.955155363, 5.955155363, 5.955155363, 7.020735545, 7.020735545, 7.020735545], degree=2, weights=[1, 0.86139323, 1]))
            add(Edge.make_bspline(
                [(2.106854232, 0.854894524), (1.484764498, 0.823436889), (1.514750368, 0.104979402), (1.544736237, -0.613478086), (2.166647388, -0.577741646)],
                knots=[3.181025595, 3.181025595, 3.181025595, 4.754799698, 4.754799698, 6.328573801, 6.328573801, 6.328573801], degree=2, weights=[1, 0.706053195, 1, 0.706053195, 1]))
            add(Edge.make_bspline(
                [(2.663138962, 0.487388037), (2.516900136, 0.900606071), (2.106854232, 0.854894524)],
                knots=[2.404042441, 2.404042441, 2.404042441, 3.565685694, 3.565685694, 3.565685694], degree=2, weights=[1, 0.836012096, 1]))
            ThreePointArc((2.663138962, 0.487388037), (2.687052521, 0.455787841), (2.724820382, 0.443787032))
        make_face()
        with BuildLine():
            Line((-0.583484164, 0.443787032), (0.352350759, 0.443787032))
            ThreePointArc((0.352350759, 0.443787032), (0.370660979, 0.451874829), (0.381594807, 0.468641703))
            ThreePointArc((0.381594807, 0.468641703), (0.38478126, 0.512633483), (0.377406248, 0.556119567))
            ThreePointArc((0.377406248, 0.556119567), (0.316958398, 0.689104808), (0.240244136, 0.81341868))
            add(Edge.make_bspline(
                [(0.240244136, 0.81341868), (-0.178053426, 1.454553053), (-1.120854898, 1.454553053)],
                knots=[0.342748392, 0.342748392, 0.342748392, 1.381331695, 1.381331695, 1.381331695], degree=2, weights=[1, 0.868170926, 1]))
            Line((-1.120854898, 1.454553053), (-1.214475951, 1.454553068))
            add(Edge.make_bspline(
                [(-1.214475951, 1.454553068), (-2.800132813, 1.454553068), (-2.800132813, 0.203397992)],
                knots=[4.81203319, 4.81203319, 4.81203319, 6.344970327, 6.344970327, 6.344970327], degree=2, weights=[1, 0.720364542, 1]))
            Line((-2.800132813, 0.203397992), (-2.800132806, 0.073267738))
            add(Edge.make_bspline(
                [(-2.800132806, 0.073267738), (-2.800132806, -1.177887338), (-1.214475944, -1.177887338)],
                knots=[3.079807634, 3.079807634, 3.079807634, 4.612744771, 4.612744771, 4.612744771], degree=2, weights=[1, 0.720364542, 1]))
            Line((-1.214475944, -1.177887338), (-1.120854891, -1.177887375))
            add(Edge.make_bspline(
                [(-1.120854891, -1.177887375), (-0.178053419, -1.177887375), (0.240244143, -0.536753002)],
                knots=[1.760260959, 1.760260959, 1.760260959, 2.798844261, 2.798844261, 2.798844261], degree=2, weights=[1, 0.868170926, 1]))
            ThreePointArc((0.240244143, -0.536753002), (0.313994237, -0.417650167), (0.372658208, -0.290437354))
            ThreePointArc((0.372658208, -0.290437354), (0.384251196, -0.24211404), (0.382489087, -0.192450825))
            ThreePointArc((0.382489087, -0.192450825), (0.370484527, -0.171527836), (0.347824512, -0.163257123))
            Line((0.347824512, -0.163257123), (-0.58348421, -0.163257123))
            ThreePointArc((-0.58348421, -0.163257123), (-0.62125204, -0.175257922), (-0.645165579, -0.206858093))
            add(Edge.make_bspline(
                [(-1.141657158, -0.577741646), (-0.776549247, -0.578100851), (-0.645165579, -0.206858093)],
                knots=[5.955155363, 5.955155363, 5.955155363, 7.020735545, 7.020735545, 7.020735545], degree=2, weights=[1, 0.86139323, 1]))
            add(Edge.make_bspline(
                [(-1.201450314, 0.854894524), (-1.823540048, 0.823436889), (-1.793554178, 0.104979402), (-1.763568309, -0.613478086), (-1.141657158, -0.577741646)],
                knots=[3.181025595, 3.181025595, 3.181025595, 4.754799698, 4.754799698, 6.328573801, 6.328573801, 6.328573801], degree=2, weights=[1, 0.706053195, 1, 0.706053195, 1]))
            add(Edge.make_bspline(
                [(-0.645165584, 0.487388037), (-0.79140441, 0.900606071), (-1.201450314, 0.854894524)],
                knots=[2.404042441, 2.404042441, 2.404042441, 3.565685694, 3.565685694, 3.565685694], degree=2, weights=[1, 0.836012096, 1]))
            ThreePointArc((-0.645165584, 0.487388037), (-0.621252025, 0.455787841), (-0.583484164, 0.443787032))
        make_face()
        with BuildLine():
            Line((-3.89178871, 0.443787032), (-2.955953786, 0.443787032))
            ThreePointArc((-2.955953786, 0.443787032), (-2.937643536, 0.451874816), (-2.926709688, 0.468641703))
            ThreePointArc((-2.926709688, 0.468641703), (-2.923523234, 0.512633483), (-2.930898247, 0.556119567))
            ThreePointArc((-2.930898247, 0.556119567), (-2.991346096, 0.689104808), (-3.068060358, 0.81341868))
            add(Edge.make_bspline(
                [(-3.068060358, 0.81341868), (-3.48635792, 1.454553053), (-4.429159392, 1.454553053)],
                knots=[0.342748392, 0.342748392, 0.342748392, 1.381331695, 1.381331695, 1.381331695], degree=2, weights=[1, 0.868170926, 1]))
            Line((-4.429159392, 1.454553053), (-4.522780446, 1.454553068))
            add(Edge.make_bspline(
                [(-4.522780446, 1.454553068), (-6.108437307, 1.454553068), (-6.108437307, 0.203397992)],
                knots=[4.81203319, 4.81203319, 4.81203319, 6.344970327, 6.344970327, 6.344970327], degree=2, weights=[1, 0.720364542, 1]))
            Line((-6.108437307, 0.203397992), (-6.108437352, 0.073267738))
            add(Edge.make_bspline(
                [(-6.108437352, 0.073267738), (-6.108437352, -1.177887338), (-4.52278049, -1.177887338)],
                knots=[3.079807634, 3.079807634, 3.079807634, 4.612744771, 4.612744771, 4.612744771], degree=2, weights=[1, 0.720364542, 1]))
            Line((-4.52278049, -1.177887338), (-4.429159437, -1.177887375))
            add(Edge.make_bspline(
                [(-4.429159437, -1.177887375), (-3.486357965, -1.177887375), (-3.068060402, -0.536753002)],
                knots=[1.760260959, 1.760260959, 1.760260959, 2.798844261, 2.798844261, 2.798844261], degree=2, weights=[1, 0.868170926, 1]))
            ThreePointArc((-3.068060402, -0.536753002), (-2.994310308, -0.417650167), (-2.935646337, -0.290437354))
            ThreePointArc((-2.935646337, -0.290437354), (-2.92405335, -0.24211404), (-2.925815458, -0.192450825))
            ThreePointArc((-2.925815458, -0.192450825), (-2.937820019, -0.171527836), (-2.960480033, -0.163257123))
            Line((-2.960480033, -0.163257123), (-3.891788755, -0.163257123))
            ThreePointArc((-3.891788755, -0.163257123), (-3.929556585, -0.175257922), (-3.953470124, -0.206858093))
            add(Edge.make_bspline(
                [(-4.449961703, -0.577741646), (-4.084853792, -0.578100851), (-3.953470124, -0.206858093)],
                knots=[5.955155363, 5.955155363, 5.955155363, 7.020735545, 7.020735545, 7.020735545], degree=2, weights=[1, 0.86139323, 1]))
            add(Edge.make_bspline(
                [(-4.509754859, 0.854894524), (-5.131844593, 0.82343689), (-5.101858724, 0.104979402), (-5.071872854, -0.613478086), (-4.449961703, -0.577741646)],
                knots=[3.181025595, 3.181025595, 3.181025595, 4.754799698, 4.754799698, 6.328573801, 6.328573801, 6.328573801], degree=2, weights=[1, 0.706053195, 1, 0.706053195, 1]))
            add(Edge.make_bspline(
                [(-3.95347013, 0.487388037), (-4.099708956, 0.900606071), (-4.509754859, 0.854894524)],
                knots=[2.40404244, 2.40404244, 2.40404244, 3.565685694, 3.565685694, 3.565685694], degree=2, weights=[1, 0.836012096, 1]))
            ThreePointArc((-3.95347013, 0.487388037), (-3.92955657, 0.455787841), (-3.89178871, 0.443787032))
        make_face()
    extrude(amount=CUT_EXTRUDE3_DEPTH, mode=Mode.SUBTRACT)

    # Sketch7 → Cut-Extrude4 (cut, through all)
    with BuildSketch(Plane(origin=(0, 1.5, 0), x_dir=(1, 0, 0), z_dir=(0, 1, 0))):
        with Locations((-2.868336067, 10.6)):
            Rectangle(SKETCH7_W, SKETCH7_H)
    extrude(amount=-CUT_EXTRUDE4_DEPTH, mode=Mode.SUBTRACT)

    # Sketch8 → Cut-Extrude5 (cut, through all)
    with BuildSketch(Plane(origin=(0, 1.5, 0), x_dir=(1, 0, 0), z_dir=(0, 1, 0))):
        with Locations((-4.294025381, 2.4)):
            Rectangle(SKETCH8_W, SKETCH8_H)
    extrude(amount=-CUT_EXTRUDE5_DEPTH, mode=Mode.SUBTRACT)


solid = part.part
